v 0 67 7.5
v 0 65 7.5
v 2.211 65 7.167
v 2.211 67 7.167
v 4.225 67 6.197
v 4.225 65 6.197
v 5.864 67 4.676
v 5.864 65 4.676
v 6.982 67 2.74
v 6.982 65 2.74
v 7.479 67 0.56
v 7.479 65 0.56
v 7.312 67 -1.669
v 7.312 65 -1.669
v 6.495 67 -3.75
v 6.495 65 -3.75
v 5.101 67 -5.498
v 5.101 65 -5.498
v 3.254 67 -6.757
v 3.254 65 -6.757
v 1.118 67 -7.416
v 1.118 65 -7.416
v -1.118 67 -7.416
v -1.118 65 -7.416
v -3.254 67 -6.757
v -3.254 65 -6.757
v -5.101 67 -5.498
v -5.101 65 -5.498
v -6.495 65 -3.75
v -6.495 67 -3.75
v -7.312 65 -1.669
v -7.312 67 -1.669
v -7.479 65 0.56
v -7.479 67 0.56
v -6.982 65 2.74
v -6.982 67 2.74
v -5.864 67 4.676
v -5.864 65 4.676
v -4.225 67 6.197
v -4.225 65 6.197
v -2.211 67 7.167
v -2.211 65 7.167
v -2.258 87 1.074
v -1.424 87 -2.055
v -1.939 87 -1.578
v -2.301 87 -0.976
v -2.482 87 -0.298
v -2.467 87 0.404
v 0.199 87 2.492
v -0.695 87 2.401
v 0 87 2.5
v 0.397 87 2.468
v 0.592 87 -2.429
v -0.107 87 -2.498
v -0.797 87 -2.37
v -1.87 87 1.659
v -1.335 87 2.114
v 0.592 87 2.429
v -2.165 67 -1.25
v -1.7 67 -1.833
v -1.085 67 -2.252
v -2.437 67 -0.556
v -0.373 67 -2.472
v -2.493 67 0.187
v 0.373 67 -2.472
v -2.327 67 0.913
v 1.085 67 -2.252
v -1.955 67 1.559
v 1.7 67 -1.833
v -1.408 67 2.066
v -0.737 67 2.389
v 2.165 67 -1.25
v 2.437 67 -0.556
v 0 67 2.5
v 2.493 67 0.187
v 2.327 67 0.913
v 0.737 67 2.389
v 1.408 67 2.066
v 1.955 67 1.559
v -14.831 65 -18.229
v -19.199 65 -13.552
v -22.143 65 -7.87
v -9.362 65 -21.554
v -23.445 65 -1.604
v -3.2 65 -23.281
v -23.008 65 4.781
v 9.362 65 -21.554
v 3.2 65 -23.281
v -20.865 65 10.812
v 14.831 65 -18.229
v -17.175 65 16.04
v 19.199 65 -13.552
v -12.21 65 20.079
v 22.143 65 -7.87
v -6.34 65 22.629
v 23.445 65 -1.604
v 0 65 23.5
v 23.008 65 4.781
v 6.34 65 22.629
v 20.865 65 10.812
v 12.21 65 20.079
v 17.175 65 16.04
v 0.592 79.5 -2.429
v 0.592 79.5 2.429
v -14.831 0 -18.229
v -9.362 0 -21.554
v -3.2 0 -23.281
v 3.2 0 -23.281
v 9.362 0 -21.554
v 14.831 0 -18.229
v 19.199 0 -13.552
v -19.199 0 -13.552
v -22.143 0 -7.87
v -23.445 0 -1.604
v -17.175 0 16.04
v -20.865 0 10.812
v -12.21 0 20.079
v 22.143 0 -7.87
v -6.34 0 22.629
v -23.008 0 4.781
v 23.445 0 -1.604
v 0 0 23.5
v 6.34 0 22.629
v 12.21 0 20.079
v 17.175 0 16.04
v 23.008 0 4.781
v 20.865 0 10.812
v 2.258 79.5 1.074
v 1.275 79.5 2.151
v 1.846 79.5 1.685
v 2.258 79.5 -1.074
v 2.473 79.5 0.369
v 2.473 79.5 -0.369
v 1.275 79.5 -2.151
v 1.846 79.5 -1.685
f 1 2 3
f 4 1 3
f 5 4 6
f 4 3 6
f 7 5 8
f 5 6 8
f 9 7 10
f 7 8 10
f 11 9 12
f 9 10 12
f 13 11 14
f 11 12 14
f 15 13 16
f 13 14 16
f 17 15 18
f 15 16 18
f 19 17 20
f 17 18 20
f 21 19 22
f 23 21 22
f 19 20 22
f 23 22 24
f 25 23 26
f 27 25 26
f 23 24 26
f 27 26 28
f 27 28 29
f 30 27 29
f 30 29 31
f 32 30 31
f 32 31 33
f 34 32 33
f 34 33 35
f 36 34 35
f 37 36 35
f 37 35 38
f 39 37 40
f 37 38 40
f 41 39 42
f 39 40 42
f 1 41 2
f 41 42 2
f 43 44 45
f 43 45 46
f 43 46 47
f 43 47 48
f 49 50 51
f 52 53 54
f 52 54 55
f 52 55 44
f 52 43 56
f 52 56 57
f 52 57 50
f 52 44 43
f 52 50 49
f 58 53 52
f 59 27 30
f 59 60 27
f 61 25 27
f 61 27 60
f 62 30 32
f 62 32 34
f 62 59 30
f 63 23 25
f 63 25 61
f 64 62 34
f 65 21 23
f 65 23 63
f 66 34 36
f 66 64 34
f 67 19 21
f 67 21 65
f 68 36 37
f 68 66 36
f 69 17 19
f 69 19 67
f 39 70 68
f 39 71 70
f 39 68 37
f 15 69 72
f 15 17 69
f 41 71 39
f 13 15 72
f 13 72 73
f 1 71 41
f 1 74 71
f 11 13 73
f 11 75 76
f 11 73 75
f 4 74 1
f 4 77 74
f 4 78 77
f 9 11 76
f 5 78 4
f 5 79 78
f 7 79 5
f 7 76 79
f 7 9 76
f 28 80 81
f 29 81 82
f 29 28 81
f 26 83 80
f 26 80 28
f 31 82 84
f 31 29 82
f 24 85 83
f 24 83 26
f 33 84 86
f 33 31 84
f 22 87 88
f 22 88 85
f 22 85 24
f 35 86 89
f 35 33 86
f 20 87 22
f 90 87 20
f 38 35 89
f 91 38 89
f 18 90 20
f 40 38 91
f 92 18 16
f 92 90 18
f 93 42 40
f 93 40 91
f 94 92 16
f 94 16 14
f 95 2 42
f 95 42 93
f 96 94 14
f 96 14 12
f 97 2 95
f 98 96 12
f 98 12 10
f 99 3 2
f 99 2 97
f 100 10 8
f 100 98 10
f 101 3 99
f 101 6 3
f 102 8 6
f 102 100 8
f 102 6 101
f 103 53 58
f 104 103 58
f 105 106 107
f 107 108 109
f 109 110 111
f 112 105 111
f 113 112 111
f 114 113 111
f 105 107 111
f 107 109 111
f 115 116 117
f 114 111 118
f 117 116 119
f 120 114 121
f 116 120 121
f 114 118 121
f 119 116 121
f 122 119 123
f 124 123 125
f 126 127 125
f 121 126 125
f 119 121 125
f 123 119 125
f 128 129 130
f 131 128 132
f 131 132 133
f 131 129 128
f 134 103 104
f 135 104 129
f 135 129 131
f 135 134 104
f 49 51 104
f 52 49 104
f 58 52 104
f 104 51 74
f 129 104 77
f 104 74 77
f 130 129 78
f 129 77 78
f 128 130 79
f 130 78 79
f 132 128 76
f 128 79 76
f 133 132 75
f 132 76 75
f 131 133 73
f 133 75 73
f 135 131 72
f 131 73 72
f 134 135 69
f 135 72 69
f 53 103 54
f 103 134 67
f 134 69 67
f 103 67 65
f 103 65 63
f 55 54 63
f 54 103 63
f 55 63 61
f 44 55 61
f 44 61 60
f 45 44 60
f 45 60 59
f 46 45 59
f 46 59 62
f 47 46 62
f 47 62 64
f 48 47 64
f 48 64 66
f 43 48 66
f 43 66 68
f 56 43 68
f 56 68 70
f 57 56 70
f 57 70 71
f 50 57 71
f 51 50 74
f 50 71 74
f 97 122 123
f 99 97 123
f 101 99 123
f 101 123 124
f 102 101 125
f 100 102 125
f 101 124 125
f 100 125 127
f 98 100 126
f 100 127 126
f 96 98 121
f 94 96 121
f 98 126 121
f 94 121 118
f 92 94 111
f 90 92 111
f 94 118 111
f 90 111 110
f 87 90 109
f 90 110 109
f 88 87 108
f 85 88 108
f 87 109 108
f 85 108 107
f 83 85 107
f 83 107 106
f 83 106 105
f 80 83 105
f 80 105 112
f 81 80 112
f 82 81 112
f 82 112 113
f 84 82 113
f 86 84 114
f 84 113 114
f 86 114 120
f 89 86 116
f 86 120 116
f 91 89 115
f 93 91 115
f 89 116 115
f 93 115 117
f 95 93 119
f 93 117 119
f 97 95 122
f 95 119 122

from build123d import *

# Parameters (mm, degrees)
SKETCH1_R           = 23.5
BOSS_EXTRUDE1_DEPTH = 65
SKETCH2_R           = 7.5
BOSS_EXTRUDE2_DEPTH = 2
SKETCH3_R           = 2.5
BOSS_EXTRUDE3_DEPTH = 20
CUT_EXTRUDE2_START  = -7.5
CUT_EXTRUDE2_DEPTH  = 7.5


with BuildPart() as part:
    # Sketch1 → Boss-Extrude1 (new body)
    with BuildSketch(Plane(origin=(0, 0, 0), x_dir=(1, 0, 0), z_dir=(0, 1, 0))):
        with Locations(Location((0, 0, 0), (0, 0, 270))):
            Circle(SKETCH1_R)
    extrude(amount=BOSS_EXTRUDE1_DEPTH)

    # Sketch2 → Boss-Extrude2 (add)
    with BuildSketch(Plane(origin=(0, 65, 0), x_dir=(1, 0, 0), z_dir=(0, 1, 0))):
        with Locations(Location((0, 0, 0), (0, 0, 270))):
            Circle(SKETCH2_R)
    extrude(amount=BOSS_EXTRUDE2_DEPTH)

    # Sketch3 → Boss-Extrude3 (add)
    with BuildSketch(Plane(origin=(0, 67, 0), x_dir=(1, 0, 0), z_dir=(0, 1, 0))):
        with Locations(Location((0, 0, 0), (0, 0, 270))):
            Circle(SKETCH3_R)
    extrude(amount=BOSS_EXTRUDE3_DEPTH)

    # Sketch4 → Cut-Extrude2 (cut)
    with BuildSketch(Plane(origin=(0, 87, 0), x_dir=(1, 0, 0), z_dir=(0, 1, 0)).offset(CUT_EXTRUDE2_START)):
        with BuildLine():
            Line((0.591953549, 2.428907367), (0.591953549, -2.428907367))
            ThreePointArc((0.591953549, -2.428907367), (2.5, 0), (0.591953549, 2.428907367))
        make_face()
    extrude(amount=CUT_EXTRUDE2_DEPTH, mode=Mode.SUBTRACT)


solid = part.part
